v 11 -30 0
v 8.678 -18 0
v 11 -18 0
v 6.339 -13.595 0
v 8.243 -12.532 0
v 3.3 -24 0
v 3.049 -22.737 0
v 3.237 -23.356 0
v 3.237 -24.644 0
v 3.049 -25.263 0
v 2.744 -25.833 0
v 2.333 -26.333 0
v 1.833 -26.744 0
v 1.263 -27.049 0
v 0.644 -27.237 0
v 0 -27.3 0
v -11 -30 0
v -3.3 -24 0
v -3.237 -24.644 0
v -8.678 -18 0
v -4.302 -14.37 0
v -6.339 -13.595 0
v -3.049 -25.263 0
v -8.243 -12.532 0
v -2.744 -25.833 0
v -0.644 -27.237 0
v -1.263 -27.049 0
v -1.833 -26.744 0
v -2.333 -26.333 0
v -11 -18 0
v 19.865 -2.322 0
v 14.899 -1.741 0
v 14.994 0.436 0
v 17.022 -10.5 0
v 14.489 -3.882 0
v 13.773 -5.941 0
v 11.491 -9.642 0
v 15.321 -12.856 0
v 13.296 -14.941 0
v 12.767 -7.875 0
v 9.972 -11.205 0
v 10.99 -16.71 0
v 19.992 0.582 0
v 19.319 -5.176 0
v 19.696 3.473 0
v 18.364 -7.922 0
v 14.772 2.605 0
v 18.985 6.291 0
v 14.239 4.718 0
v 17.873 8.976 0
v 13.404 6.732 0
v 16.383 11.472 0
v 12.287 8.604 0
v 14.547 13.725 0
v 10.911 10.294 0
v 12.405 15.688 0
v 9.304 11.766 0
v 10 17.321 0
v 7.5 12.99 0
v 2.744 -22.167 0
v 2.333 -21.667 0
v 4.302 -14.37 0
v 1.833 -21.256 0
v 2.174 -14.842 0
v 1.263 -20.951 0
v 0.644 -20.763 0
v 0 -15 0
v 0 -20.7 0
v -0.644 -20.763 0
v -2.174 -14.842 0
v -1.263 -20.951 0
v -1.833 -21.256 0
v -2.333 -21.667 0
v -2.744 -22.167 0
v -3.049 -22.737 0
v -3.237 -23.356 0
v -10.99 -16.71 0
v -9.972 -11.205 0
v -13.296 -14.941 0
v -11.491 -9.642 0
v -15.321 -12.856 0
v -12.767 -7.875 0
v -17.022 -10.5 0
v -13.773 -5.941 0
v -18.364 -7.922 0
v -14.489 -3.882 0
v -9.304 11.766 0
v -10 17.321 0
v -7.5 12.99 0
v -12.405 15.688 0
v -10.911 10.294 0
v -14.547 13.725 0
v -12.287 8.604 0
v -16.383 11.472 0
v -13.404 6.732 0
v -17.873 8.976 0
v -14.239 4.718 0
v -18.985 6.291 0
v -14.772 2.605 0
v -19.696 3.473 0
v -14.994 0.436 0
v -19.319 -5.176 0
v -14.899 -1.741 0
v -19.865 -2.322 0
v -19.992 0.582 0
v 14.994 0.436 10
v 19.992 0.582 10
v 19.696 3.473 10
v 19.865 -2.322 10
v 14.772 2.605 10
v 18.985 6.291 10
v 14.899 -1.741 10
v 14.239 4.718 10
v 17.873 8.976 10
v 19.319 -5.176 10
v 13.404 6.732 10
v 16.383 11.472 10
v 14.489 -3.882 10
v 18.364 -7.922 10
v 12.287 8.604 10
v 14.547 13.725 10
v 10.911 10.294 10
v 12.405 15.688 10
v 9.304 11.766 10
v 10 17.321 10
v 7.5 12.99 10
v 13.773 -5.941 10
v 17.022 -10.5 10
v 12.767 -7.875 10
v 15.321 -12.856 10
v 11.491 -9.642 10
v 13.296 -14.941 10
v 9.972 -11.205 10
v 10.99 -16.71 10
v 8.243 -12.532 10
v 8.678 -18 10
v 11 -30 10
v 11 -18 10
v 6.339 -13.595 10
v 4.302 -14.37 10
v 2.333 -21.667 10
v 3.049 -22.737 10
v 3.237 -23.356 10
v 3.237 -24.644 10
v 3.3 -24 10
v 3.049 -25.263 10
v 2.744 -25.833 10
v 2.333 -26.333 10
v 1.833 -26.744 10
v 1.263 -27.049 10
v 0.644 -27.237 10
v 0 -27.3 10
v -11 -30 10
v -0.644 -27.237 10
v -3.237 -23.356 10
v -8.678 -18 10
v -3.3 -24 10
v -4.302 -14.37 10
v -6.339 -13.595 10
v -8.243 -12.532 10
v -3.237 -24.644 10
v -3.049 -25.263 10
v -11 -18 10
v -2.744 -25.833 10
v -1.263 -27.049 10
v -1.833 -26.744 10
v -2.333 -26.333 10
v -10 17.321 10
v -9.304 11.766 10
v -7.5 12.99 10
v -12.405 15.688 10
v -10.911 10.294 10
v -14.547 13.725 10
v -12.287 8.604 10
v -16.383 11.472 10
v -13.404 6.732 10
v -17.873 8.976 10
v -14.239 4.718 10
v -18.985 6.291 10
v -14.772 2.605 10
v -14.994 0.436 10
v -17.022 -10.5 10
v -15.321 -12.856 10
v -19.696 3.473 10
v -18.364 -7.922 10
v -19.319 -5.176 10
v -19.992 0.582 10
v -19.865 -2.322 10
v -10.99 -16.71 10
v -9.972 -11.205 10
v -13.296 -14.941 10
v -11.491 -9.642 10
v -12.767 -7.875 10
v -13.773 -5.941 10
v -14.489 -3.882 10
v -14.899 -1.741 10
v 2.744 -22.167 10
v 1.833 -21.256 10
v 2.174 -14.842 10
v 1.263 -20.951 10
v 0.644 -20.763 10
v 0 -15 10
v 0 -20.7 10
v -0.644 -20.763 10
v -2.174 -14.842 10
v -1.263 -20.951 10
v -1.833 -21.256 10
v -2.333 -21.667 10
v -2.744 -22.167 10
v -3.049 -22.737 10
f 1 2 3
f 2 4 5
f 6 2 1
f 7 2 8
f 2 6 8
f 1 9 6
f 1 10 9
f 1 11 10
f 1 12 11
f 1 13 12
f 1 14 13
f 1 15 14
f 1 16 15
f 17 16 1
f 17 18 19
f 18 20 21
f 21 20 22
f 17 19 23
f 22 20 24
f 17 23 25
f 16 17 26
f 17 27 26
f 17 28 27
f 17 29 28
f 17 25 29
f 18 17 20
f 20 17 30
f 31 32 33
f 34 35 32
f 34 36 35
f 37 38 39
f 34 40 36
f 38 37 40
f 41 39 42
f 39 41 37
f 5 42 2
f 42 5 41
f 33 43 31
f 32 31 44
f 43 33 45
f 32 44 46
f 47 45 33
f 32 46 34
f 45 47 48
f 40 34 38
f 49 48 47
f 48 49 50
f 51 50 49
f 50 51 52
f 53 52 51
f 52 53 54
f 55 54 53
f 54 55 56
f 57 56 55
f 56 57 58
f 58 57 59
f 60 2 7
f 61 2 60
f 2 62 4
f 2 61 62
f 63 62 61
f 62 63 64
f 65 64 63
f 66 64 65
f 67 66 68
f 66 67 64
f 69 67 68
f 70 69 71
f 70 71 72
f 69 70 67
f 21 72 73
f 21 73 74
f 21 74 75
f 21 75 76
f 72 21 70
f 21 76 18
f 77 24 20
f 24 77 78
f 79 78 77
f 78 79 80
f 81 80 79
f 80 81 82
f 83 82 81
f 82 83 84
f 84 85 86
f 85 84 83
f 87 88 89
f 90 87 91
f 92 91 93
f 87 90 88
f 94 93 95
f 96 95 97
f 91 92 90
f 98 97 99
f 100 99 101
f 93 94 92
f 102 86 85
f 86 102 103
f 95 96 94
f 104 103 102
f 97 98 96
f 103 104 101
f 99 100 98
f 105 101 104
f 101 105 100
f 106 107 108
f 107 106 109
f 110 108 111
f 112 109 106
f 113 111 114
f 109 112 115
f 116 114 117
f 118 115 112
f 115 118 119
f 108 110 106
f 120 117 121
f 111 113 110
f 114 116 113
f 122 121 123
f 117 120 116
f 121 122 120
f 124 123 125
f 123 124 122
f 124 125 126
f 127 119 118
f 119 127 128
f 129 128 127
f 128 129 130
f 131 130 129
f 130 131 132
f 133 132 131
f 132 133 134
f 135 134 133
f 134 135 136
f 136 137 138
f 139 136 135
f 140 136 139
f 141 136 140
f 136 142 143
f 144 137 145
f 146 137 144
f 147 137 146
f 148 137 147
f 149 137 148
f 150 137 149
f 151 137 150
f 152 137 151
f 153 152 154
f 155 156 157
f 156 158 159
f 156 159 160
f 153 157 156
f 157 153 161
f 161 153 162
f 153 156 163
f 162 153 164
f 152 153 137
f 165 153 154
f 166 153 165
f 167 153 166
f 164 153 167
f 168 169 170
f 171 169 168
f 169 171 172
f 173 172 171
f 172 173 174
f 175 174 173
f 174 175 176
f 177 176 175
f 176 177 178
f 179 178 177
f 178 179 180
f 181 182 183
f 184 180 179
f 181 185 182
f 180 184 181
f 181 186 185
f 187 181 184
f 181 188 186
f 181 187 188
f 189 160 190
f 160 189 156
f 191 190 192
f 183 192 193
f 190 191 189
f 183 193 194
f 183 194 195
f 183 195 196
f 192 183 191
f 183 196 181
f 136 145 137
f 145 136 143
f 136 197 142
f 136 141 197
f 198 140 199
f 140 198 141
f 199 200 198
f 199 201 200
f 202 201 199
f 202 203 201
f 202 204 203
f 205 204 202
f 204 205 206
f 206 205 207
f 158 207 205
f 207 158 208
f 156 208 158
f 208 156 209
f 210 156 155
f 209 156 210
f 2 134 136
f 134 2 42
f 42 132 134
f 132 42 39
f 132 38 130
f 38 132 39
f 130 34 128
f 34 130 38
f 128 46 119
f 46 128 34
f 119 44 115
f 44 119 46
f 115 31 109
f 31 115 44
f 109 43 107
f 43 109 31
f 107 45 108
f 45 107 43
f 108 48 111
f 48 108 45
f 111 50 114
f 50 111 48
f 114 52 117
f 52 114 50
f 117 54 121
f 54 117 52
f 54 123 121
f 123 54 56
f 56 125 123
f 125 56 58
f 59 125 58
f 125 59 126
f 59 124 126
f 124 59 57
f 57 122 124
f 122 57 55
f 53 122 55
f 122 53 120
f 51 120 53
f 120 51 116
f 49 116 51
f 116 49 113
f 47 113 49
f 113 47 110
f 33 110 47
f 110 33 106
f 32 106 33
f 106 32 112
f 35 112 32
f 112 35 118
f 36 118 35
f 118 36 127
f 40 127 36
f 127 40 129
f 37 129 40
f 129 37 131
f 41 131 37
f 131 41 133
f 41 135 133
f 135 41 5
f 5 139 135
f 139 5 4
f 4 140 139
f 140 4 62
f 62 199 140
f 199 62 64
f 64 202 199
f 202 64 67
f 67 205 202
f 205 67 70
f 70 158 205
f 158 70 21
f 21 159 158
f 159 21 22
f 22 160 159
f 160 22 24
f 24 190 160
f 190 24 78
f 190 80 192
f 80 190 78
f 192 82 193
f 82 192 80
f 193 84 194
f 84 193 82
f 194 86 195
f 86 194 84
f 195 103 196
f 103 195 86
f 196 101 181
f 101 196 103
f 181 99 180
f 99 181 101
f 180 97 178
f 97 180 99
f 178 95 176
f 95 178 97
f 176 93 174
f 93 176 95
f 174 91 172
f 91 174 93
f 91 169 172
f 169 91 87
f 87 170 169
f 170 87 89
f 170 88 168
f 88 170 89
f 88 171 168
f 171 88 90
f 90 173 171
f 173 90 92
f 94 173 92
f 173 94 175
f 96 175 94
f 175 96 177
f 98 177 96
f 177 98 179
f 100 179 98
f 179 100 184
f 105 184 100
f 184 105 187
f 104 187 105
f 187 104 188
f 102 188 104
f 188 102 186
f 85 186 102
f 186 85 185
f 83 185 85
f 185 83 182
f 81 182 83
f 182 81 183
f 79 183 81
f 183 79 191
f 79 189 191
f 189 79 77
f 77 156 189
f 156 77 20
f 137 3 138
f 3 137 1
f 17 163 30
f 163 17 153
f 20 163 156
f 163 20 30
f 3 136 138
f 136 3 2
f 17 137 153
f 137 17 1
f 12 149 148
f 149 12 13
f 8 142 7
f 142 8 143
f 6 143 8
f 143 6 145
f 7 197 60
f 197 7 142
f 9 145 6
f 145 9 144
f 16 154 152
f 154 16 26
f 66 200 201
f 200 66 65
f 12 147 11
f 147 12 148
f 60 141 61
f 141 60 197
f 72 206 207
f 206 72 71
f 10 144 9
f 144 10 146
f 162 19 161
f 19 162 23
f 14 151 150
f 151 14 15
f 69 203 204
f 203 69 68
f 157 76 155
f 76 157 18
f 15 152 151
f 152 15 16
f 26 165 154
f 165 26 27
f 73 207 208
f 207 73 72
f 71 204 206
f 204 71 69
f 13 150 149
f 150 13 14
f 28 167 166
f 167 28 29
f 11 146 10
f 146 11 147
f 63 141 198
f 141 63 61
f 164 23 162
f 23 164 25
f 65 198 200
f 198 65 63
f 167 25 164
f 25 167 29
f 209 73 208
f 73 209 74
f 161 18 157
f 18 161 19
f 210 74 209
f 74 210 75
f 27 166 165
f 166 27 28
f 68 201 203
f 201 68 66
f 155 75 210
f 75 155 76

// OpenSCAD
$fn = 32;

// ----------------------------------------------------------------------
// Spring clip: 40 mm outside, 5 mm band, 60 degree opening
// ----------------------------------------------------------------------

// --- parameters (mm) ---
outer_r = 20;             // clip outside radius
inner_r = 15;             // clip bore radius
band = 5;                 // band thickness
clip_w = 10;              // clip width
opening = 60;             // opening angle
tab_w = 22;               // tab width
tab_len = 10;             // tab length past the clip
tab_hole = 6.6;           // tab fixing hole

clip_profile = [[-10, 17.321], [-12.405, 15.688], [-14.547, 13.725], [-16.383, 11.472], [-17.873, 8.976], [-18.985, 6.291], [-19.696, 3.473], [-19.992, 0.582], [-19.865, -2.322], [-19.319, -5.176], [-18.364, -7.922], [-17.022, -10.5], [-15.321, -12.856], [-13.296, -14.941], [-10.99, -16.71], [-8.452, -18.126], [-5.736, -19.16], [-2.899, -19.789], [0, -20], [2.899, -19.789], [5.736, -19.16], [8.452, -18.126], [10.99, -16.71], [13.296, -14.941], [15.321, -12.856], [17.022, -10.5], [18.364, -7.922], [19.319, -5.176], [19.865, -2.322], [19.992, 0.582], [19.696, 3.473], [18.985, 6.291], [17.873, 8.976], [16.383, 11.472], [14.547, 13.725], [12.405, 15.688], [10, 17.321], [7.5, 12.99], [9.304, 11.766], [10.911, 10.294], [12.287, 8.604], [13.404, 6.732], [14.239, 4.718], [14.772, 2.605], [14.994, 0.436], [14.899, -1.741], [14.489, -3.882], [13.773, -5.941], [12.767, -7.875], [11.491, -9.642], [9.972, -11.205], [8.243, -12.532], [6.339, -13.595], [4.302, -14.37], [2.174, -14.842], [0, -15], [-2.174, -14.842], [-4.302, -14.37], [-6.339, -13.595], [-8.243, -12.532], [-9.972, -11.205], [-11.491, -9.642], [-12.767, -7.875], [-13.773, -5.941], [-14.489, -3.882], [-14.899, -1.741], [-14.994, 0.436], [-14.772, 2.605], [-14.239, 4.718], [-13.404, 6.732], [-12.287, 8.604], [-10.911, 10.294], [-9.304, 11.766], [-7.5, 12.99]];

difference() {
  union() {
    linear_extrude(height = clip_w) polygon(clip_profile);
    /* mounting tab, sunk 2 mm into the band */
    translate([-11, -30, 0]) cube([tab_w, 12, clip_w]);
  }
  translate([0, -24, -2.5]) cylinder(h = clip_w + 5, d = tab_hole);
}
